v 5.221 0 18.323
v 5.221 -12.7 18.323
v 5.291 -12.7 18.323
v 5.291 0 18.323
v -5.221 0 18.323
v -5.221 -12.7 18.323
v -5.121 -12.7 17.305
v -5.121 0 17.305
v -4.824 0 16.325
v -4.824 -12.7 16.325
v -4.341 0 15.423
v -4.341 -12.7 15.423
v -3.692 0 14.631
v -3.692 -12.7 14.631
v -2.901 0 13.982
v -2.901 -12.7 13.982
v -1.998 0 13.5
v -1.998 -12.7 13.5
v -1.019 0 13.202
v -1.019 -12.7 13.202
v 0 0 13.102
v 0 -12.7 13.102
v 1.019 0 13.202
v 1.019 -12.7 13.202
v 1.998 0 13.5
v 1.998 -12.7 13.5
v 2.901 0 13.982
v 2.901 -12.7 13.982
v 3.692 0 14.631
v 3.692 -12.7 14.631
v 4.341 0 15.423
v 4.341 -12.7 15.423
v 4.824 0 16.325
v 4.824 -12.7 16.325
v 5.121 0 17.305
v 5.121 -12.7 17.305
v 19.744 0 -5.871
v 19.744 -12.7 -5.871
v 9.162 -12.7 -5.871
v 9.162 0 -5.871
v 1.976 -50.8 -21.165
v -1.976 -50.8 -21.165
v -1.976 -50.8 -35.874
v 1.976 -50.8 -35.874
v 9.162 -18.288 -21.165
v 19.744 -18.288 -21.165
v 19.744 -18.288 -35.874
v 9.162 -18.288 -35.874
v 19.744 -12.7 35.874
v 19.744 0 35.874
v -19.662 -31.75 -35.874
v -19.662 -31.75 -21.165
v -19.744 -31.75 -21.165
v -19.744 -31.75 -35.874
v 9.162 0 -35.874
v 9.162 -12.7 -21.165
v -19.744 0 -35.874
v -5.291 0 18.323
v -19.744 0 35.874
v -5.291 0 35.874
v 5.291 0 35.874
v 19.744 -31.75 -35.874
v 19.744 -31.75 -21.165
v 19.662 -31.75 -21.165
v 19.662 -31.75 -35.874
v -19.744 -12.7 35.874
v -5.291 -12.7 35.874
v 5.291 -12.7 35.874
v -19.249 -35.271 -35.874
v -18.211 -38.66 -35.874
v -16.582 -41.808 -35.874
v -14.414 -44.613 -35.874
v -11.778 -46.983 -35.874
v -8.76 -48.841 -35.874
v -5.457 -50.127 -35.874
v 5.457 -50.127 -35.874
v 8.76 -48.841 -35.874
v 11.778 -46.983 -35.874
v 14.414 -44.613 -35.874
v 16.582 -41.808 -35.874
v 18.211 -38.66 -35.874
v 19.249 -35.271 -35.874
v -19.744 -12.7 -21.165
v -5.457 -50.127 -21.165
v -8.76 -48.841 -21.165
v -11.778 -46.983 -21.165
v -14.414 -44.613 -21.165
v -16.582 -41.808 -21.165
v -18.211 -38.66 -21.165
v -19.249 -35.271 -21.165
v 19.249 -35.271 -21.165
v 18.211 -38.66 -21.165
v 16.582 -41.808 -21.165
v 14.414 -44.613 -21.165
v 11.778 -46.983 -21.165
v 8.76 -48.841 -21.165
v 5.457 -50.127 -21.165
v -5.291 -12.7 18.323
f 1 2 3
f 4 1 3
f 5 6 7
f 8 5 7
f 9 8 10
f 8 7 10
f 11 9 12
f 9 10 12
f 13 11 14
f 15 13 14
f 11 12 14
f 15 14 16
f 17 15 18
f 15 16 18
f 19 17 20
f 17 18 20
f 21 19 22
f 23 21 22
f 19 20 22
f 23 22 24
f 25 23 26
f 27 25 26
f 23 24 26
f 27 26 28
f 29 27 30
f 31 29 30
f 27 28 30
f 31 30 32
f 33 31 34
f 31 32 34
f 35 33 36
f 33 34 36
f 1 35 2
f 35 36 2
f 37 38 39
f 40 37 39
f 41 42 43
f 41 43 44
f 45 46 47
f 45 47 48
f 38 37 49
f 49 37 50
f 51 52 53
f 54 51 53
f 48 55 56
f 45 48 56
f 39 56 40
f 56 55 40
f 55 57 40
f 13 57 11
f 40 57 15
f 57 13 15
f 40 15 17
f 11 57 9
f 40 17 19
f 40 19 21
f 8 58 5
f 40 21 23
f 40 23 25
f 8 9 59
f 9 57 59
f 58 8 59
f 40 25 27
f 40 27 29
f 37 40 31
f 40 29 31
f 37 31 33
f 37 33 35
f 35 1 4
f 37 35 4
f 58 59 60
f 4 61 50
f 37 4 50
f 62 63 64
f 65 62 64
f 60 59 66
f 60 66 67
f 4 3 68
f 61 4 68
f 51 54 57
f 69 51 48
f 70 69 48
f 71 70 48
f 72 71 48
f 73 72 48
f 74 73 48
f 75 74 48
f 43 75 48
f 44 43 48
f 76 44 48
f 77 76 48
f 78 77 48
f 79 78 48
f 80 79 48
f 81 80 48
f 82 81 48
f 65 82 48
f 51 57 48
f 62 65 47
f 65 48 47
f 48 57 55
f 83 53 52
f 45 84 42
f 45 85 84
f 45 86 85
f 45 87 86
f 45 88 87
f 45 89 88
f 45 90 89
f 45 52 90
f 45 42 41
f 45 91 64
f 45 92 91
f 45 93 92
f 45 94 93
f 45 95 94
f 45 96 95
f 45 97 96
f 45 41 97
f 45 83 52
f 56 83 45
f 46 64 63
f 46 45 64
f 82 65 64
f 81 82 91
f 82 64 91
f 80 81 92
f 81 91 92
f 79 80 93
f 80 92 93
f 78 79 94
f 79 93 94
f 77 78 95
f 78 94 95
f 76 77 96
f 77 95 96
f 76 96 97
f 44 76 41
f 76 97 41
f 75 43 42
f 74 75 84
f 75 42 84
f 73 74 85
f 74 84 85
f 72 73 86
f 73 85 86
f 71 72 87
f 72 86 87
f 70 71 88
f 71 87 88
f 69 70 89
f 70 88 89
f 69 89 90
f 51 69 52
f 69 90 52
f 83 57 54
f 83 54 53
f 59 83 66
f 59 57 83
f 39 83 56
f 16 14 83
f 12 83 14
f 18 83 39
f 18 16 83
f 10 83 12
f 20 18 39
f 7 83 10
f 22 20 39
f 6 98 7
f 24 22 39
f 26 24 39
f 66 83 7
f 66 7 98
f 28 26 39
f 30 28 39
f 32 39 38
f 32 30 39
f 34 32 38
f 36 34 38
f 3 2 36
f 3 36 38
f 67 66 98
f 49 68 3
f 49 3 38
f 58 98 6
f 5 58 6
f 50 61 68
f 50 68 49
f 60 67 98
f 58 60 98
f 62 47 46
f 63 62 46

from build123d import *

# Parameters (mm, degrees)
F0_W     = 39.4888110459
F0_H     = 71.7479661107
F1_DEPTH = 12.7
F2_W     = 39.4888110459
F2_H     = 14.7085804492
F3_DEPTH = 38.1
F5_DEPTH = 25.4
F7_DEPTH = 25.4
F8_W     = 10.5819702148
F8_H     = 30.0025250763
F9_DEPTH = 18.288


with BuildPart() as f1:
    # F0 (on Front) → F1 (new body)
    with BuildSketch(Plane.XZ):
        Rectangle(F0_W, F0_H)
    extrude(amount=F1_DEPTH)

    # F2 (on face) → F3 (join)
    with BuildSketch(Plane.XZ.offset(12.7)):
        with Locations((0, -28.5196928307)):
            Rectangle(F2_W, F2_H)
    extrude(amount=F3_DEPTH)

    # F4 (on face) → F5 (cut)
    with BuildSketch(Plane.XZ.offset(12.7)):
        with BuildLine():
            Line((-5.2909860387, 53.4245613962), (-5.2909860387, 18.3234047145))
            Line((-5.2909860387, 18.3234047145), (-5.2212785764, 18.3234047145))
            ThreePointArc((-5.2212785764, 18.3234047145), (0, 13.1021261381), (5.2212785764, 18.3234047145))
            Line((5.2212785764, 18.3234047145), (5.2909860387, 18.3234047145))
            Line((5.2909860387, 18.3234047145), (5.2909860387, 53.4245613962))
            Line((5.2909860387, 53.4245613962), (-5.2909860387, 53.4245613962))
        make_face()
    extrude(amount=-F5_DEPTH, mode=Mode.SUBTRACT)

    # F6 (on face) → F7 (cut)
    with BuildSketch(Plane.XY.offset(-21.1654026061)):
        with BuildLine():
            ThreePointArc((-1.976119183, -50.8), (-14.4143084854, -44.6129399446), (-19.6615021384, -31.75))
            Line((-19.6615021384, -31.75), (-19.7444055229, -31.75))
            Line((-19.7444055229, -31.75), (-19.7444055229, -50.8))
            Line((-19.7444055229, -50.8), (-1.976119183, -50.8))
        make_face()
        with BuildLine():
            Line((19.7444055229, -31.75), (19.6615021384, -31.75))
            ThreePointArc((19.6615021384, -31.75), (14.4143084854, -44.6129399446), (1.976119183, -50.8))
            Line((1.976119183, -50.8), (19.7444055229, -50.8))
            Line((19.7444055229, -50.8), (19.7444055229, -31.75))
        make_face()
    extrude(amount=-F7_DEPTH, mode=Mode.SUBTRACT)

    # F8 (on face) → F9 (cut)
    with BuildSketch(Plane(origin=(0, 0, 0), x_dir=(-1, 0, 0), z_dir=(0, 1, 0))):
        with Locations((-14.4534204155, -20.8727205172)):
            Rectangle(F8_W, F8_H)
    extrude(amount=-F9_DEPTH, mode=Mode.SUBTRACT)


solid = f1.part
